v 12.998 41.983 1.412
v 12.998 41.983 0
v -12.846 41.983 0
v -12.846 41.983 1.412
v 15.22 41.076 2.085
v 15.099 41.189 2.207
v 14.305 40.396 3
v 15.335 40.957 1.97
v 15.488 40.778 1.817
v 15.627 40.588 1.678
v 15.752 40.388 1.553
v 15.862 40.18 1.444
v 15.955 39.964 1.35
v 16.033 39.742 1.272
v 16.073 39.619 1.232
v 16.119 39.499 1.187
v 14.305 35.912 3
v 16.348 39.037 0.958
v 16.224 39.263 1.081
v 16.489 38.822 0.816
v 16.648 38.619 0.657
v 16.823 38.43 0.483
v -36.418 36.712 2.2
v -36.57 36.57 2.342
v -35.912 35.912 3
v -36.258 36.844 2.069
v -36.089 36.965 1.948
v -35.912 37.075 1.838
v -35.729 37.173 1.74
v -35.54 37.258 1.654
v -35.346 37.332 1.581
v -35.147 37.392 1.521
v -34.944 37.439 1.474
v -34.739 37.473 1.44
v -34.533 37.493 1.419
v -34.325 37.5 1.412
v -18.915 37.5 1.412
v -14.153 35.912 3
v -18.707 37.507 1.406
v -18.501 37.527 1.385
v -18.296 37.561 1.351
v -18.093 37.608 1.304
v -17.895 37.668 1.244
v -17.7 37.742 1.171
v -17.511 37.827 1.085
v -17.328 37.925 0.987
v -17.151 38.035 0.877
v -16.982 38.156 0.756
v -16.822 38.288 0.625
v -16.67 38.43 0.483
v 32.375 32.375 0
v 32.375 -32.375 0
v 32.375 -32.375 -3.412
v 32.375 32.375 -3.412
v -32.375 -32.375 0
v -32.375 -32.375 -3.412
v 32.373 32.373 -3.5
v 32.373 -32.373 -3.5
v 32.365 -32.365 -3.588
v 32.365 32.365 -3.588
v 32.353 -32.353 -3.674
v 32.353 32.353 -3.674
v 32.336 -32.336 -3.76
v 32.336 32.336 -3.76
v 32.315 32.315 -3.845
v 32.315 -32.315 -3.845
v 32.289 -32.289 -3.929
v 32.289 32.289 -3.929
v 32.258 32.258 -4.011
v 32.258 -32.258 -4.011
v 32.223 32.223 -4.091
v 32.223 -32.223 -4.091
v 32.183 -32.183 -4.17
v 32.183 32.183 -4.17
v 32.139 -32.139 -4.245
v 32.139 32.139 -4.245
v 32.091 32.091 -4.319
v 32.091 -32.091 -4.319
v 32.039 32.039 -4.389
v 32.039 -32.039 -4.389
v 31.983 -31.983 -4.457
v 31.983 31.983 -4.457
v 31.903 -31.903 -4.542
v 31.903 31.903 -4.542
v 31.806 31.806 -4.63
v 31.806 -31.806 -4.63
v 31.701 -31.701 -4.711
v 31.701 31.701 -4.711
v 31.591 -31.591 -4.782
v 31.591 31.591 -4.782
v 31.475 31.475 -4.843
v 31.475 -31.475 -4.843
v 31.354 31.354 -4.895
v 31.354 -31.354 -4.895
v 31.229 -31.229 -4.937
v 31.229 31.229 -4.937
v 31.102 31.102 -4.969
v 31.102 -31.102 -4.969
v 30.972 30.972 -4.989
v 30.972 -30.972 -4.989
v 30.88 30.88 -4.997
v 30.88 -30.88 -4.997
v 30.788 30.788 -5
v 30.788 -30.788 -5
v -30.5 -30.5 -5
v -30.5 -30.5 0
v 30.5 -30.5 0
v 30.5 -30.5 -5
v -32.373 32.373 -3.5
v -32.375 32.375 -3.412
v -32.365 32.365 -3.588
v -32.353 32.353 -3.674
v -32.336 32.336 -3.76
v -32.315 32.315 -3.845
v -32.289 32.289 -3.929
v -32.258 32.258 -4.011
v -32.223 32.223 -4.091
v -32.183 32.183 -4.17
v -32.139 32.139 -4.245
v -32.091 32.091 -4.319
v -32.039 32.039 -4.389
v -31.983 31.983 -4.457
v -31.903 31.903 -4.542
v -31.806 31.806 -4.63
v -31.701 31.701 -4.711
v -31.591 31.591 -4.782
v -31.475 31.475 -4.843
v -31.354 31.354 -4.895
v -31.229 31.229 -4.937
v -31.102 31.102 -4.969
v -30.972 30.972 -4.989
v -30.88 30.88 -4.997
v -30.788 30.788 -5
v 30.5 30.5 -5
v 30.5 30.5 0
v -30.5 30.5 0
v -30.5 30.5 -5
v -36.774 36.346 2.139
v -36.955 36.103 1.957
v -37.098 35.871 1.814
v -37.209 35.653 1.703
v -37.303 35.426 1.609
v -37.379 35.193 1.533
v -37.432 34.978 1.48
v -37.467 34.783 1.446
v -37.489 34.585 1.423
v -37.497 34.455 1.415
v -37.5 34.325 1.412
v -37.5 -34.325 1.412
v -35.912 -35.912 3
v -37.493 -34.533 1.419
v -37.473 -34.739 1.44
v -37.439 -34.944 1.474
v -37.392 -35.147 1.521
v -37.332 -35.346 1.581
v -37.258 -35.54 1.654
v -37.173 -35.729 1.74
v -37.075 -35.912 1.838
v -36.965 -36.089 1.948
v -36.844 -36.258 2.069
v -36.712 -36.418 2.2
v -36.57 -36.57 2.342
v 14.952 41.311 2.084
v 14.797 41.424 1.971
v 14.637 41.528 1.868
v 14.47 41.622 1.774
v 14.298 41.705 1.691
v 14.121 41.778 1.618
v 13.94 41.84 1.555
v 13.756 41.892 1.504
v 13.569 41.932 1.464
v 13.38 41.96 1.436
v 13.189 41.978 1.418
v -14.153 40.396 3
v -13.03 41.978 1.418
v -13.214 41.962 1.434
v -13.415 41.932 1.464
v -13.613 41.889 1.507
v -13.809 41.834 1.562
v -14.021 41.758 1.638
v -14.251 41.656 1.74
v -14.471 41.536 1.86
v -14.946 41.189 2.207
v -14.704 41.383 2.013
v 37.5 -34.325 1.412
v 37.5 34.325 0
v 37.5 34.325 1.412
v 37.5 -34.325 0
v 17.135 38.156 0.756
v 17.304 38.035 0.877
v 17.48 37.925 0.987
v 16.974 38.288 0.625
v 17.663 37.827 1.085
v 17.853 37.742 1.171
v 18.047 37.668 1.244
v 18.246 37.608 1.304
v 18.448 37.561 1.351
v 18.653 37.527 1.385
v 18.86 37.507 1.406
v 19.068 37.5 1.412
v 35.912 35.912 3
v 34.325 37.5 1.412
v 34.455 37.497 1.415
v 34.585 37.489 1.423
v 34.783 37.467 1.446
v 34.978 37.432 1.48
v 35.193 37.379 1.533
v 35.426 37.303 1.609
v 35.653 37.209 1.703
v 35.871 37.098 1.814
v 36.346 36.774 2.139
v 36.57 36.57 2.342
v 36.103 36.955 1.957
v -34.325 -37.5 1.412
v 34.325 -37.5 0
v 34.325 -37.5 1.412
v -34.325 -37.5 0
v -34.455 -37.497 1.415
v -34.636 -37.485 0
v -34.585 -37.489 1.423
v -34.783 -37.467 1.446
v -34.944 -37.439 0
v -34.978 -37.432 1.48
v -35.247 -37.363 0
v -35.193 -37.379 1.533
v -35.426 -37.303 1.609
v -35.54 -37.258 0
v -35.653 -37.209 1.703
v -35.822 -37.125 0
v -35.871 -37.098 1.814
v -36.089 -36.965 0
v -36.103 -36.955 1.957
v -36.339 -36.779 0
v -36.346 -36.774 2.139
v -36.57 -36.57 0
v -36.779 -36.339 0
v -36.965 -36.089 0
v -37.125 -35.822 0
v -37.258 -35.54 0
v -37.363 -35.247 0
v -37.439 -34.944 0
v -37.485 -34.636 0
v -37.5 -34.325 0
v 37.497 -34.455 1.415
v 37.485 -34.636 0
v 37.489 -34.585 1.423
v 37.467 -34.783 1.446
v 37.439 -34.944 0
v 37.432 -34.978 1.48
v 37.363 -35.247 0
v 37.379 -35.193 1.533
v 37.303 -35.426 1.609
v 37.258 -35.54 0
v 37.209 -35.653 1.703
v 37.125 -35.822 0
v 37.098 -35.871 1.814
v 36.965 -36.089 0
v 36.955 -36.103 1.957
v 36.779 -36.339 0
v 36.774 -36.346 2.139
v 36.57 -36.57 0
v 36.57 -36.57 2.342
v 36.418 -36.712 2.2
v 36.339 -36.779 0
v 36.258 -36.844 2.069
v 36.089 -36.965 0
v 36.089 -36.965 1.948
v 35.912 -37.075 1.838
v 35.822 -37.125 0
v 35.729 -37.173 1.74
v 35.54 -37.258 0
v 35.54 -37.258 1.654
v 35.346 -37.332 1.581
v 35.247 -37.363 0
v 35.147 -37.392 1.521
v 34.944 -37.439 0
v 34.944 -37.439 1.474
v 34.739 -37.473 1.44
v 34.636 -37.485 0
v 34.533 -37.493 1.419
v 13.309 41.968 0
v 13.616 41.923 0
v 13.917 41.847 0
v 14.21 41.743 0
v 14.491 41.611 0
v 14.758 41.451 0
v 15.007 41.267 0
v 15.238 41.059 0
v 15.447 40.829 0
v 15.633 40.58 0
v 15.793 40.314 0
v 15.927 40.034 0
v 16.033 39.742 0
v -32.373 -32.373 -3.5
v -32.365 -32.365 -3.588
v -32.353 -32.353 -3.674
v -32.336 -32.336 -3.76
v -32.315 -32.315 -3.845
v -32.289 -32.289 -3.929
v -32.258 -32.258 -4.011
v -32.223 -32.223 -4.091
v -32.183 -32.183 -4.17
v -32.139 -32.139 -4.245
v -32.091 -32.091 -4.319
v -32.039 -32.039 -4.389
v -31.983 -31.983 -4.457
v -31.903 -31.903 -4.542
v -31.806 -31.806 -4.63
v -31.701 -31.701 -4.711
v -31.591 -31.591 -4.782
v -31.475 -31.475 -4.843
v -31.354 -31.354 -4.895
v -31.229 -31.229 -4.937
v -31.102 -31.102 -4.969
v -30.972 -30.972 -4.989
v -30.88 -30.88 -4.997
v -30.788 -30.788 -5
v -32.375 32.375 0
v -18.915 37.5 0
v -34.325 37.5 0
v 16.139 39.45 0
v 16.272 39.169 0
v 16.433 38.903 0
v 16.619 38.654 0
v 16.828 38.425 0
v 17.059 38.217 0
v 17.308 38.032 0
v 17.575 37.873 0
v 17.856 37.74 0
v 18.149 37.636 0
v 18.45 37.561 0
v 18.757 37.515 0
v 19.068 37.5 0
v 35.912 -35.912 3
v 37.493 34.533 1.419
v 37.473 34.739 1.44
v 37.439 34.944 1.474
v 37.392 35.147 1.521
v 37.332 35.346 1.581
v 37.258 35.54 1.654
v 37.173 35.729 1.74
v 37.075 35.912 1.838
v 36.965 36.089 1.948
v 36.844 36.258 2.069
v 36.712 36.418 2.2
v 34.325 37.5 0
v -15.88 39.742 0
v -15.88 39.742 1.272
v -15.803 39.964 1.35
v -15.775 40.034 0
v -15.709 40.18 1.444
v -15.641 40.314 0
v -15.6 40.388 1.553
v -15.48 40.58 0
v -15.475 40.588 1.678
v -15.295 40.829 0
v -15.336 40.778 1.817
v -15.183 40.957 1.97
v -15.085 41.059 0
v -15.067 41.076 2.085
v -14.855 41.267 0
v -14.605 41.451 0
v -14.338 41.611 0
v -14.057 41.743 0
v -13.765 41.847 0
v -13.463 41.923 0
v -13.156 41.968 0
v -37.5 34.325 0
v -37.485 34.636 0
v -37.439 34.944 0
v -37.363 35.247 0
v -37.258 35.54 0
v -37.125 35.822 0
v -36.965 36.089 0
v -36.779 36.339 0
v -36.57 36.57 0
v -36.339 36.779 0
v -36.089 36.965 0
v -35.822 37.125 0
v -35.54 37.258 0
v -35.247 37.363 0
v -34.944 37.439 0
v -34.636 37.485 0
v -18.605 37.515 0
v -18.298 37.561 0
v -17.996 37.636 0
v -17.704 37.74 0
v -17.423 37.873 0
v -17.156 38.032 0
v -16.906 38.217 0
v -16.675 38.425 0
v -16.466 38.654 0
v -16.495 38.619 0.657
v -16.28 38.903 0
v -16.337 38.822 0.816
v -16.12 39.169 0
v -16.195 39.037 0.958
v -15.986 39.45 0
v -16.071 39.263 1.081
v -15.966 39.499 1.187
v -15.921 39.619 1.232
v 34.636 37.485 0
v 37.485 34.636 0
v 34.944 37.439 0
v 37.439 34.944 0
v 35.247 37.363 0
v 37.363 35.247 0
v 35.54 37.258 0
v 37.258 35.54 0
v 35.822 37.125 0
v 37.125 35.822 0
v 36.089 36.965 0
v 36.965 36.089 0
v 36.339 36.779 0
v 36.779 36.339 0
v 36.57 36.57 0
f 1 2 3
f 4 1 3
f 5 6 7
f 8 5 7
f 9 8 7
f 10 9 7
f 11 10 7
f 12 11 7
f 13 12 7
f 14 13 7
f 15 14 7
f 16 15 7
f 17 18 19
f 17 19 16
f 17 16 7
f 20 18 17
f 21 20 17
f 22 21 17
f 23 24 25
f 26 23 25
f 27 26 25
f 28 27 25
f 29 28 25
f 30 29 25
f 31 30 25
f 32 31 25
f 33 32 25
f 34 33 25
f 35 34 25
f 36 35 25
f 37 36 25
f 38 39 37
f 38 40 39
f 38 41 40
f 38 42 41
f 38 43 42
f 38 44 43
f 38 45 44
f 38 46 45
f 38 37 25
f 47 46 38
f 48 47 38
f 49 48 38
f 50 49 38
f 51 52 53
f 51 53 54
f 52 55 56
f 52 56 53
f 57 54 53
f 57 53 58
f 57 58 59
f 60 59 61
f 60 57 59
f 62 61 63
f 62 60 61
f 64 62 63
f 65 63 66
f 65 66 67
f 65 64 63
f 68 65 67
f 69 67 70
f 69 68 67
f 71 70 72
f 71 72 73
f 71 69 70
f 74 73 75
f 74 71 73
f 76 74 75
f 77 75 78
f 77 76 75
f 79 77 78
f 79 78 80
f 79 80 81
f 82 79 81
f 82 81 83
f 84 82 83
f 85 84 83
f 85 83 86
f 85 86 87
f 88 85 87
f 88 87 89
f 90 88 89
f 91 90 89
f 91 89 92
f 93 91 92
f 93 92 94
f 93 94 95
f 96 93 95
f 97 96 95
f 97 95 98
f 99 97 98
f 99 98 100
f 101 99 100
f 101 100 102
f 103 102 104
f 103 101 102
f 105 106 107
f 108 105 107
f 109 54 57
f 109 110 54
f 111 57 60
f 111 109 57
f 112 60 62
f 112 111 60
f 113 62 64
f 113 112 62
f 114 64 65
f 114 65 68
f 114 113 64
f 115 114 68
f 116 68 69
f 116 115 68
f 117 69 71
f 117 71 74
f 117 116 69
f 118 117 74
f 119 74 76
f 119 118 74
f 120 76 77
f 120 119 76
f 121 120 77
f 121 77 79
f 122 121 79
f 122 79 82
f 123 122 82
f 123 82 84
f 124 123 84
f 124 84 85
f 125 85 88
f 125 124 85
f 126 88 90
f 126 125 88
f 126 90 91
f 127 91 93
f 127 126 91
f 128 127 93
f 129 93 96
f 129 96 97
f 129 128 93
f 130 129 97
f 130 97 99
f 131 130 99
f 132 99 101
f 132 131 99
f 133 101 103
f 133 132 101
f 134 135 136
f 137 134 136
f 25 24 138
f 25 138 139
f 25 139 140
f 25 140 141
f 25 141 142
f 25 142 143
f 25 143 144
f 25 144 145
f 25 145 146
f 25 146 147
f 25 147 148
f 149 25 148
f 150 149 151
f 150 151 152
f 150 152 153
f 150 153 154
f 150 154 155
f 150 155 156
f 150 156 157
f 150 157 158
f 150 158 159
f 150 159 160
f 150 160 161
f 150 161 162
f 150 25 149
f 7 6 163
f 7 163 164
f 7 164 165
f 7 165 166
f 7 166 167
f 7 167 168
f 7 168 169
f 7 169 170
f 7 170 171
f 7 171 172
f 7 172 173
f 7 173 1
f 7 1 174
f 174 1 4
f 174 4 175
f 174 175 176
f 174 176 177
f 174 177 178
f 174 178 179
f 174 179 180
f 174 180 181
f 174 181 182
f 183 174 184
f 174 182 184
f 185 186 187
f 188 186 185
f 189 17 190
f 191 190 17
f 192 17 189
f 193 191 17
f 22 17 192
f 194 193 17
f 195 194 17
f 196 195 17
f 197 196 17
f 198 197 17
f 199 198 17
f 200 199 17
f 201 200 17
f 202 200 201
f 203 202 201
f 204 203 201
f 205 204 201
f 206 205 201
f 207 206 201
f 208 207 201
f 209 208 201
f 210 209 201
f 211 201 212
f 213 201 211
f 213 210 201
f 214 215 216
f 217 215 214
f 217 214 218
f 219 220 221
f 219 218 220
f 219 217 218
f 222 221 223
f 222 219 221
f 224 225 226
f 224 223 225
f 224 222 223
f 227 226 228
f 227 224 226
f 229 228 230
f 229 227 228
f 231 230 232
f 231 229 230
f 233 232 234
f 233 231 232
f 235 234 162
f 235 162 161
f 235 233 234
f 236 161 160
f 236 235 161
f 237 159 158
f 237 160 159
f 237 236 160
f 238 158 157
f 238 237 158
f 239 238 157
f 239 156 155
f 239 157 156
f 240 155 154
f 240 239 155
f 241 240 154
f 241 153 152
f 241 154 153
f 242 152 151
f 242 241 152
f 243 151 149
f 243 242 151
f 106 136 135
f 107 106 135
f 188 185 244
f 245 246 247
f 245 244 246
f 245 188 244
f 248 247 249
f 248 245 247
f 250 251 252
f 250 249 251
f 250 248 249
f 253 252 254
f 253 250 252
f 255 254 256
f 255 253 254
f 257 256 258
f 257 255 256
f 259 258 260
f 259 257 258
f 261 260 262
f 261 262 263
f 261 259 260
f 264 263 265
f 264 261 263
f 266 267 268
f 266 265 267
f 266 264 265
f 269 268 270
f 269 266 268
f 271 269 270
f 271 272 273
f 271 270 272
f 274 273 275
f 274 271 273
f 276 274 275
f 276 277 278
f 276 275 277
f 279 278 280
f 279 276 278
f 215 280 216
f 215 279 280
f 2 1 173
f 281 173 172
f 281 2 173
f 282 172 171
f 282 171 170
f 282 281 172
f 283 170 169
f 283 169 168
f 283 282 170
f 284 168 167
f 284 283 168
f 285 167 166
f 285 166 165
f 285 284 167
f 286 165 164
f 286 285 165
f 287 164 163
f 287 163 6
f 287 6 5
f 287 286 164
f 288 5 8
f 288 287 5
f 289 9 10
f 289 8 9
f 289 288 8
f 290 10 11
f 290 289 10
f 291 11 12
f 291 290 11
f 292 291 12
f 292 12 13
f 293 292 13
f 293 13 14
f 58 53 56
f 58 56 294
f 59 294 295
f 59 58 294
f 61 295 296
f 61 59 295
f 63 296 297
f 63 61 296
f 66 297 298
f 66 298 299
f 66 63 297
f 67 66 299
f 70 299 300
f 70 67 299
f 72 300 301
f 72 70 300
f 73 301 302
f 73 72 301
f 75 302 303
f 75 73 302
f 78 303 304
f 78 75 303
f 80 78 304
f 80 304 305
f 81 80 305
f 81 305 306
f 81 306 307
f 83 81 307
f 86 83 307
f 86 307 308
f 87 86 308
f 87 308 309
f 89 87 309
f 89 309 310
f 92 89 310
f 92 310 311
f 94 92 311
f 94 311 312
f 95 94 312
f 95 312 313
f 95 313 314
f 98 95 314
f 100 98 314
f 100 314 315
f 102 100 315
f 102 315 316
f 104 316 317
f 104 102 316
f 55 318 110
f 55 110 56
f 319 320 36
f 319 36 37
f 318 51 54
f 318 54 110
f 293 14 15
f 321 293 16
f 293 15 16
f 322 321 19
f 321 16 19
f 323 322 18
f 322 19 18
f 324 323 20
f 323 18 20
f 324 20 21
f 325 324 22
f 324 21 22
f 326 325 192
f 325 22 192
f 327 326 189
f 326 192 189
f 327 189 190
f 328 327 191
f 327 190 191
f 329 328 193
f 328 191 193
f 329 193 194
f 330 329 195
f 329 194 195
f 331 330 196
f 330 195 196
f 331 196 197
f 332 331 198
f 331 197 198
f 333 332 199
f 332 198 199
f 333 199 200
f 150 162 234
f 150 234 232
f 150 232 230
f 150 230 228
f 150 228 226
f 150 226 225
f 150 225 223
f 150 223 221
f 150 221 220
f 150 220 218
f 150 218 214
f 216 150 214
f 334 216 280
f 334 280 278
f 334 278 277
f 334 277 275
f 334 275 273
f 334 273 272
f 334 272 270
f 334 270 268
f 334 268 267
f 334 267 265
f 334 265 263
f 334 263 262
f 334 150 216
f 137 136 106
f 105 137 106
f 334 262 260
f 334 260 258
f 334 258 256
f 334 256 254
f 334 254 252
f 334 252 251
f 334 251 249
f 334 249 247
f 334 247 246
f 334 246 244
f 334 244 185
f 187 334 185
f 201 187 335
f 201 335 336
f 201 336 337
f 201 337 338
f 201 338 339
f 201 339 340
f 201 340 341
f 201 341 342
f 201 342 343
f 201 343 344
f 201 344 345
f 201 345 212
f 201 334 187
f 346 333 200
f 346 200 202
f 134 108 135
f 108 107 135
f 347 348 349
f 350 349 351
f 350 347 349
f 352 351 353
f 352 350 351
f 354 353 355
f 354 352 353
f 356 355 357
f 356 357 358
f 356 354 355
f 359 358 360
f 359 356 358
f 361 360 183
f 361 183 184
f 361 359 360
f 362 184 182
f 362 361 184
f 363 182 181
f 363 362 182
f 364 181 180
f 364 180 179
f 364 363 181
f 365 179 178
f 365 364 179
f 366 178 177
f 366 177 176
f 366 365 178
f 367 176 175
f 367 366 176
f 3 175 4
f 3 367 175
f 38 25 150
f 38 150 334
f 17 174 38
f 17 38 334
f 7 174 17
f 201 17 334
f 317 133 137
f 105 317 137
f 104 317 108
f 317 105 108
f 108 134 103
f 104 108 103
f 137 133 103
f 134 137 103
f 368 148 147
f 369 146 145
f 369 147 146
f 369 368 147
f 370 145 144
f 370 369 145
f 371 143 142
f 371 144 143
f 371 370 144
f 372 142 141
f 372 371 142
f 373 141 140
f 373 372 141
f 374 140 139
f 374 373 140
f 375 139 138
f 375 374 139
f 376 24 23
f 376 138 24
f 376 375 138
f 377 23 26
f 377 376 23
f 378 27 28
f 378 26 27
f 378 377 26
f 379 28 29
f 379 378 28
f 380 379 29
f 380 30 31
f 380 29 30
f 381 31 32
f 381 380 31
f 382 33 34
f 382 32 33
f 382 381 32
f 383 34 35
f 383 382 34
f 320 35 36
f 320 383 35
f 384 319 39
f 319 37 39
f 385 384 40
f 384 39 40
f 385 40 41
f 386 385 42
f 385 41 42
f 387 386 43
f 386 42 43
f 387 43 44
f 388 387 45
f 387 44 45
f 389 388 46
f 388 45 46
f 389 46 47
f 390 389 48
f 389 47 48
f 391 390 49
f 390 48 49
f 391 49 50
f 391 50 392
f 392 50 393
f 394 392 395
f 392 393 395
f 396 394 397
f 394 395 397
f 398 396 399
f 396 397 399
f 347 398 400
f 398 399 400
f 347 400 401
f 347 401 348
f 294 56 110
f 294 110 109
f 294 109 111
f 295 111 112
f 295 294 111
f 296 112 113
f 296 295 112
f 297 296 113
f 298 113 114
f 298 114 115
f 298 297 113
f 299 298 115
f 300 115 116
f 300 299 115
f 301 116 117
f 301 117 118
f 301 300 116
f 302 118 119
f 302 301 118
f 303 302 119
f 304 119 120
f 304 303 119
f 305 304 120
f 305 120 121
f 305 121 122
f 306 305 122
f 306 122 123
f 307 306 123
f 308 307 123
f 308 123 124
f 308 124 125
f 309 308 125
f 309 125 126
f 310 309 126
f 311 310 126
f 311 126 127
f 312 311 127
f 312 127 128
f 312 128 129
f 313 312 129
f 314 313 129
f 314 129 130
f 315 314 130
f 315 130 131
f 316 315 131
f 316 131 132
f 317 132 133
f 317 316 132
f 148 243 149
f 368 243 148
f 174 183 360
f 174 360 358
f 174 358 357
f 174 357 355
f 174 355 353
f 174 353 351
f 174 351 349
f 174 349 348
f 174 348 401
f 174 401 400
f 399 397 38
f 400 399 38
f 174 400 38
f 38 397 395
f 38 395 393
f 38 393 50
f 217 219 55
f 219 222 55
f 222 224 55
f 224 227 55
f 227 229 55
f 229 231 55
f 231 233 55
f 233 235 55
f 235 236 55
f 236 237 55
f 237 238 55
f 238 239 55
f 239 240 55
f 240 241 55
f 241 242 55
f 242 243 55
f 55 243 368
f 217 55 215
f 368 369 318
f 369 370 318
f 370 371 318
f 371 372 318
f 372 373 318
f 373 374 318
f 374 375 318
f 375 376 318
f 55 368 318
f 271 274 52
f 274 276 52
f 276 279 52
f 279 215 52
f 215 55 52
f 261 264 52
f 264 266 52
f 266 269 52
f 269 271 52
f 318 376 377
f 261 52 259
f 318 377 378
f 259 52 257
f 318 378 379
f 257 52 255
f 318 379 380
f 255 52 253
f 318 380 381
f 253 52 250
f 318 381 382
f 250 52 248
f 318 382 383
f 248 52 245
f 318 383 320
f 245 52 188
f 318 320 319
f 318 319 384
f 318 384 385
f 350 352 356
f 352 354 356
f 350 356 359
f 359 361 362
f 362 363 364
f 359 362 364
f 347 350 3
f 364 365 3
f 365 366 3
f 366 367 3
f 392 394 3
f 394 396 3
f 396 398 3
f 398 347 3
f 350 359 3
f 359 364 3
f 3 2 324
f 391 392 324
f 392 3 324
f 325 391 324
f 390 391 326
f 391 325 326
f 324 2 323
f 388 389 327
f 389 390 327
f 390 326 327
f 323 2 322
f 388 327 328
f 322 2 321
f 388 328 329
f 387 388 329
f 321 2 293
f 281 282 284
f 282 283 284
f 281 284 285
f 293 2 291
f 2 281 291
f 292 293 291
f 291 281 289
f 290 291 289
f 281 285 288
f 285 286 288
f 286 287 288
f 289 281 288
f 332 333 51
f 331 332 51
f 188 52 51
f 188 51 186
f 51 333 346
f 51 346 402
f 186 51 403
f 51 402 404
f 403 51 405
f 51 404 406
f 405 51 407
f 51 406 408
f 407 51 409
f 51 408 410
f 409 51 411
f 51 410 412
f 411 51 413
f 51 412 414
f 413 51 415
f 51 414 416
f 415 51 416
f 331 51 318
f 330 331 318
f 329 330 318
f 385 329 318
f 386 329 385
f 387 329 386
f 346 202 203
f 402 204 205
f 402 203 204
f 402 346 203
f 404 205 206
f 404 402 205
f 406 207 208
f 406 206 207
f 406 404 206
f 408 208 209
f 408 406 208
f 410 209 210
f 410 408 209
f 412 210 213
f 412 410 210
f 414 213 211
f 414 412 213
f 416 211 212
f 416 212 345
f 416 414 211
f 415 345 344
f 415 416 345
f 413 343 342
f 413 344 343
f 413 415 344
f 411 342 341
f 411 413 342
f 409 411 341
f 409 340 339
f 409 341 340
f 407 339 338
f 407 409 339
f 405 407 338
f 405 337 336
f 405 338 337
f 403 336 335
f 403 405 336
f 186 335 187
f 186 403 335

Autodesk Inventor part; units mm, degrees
ref_plane "YZ Plane" through (0, 0, 0) normal (1, 0, 0) x (0, 1, 0)
ref_plane "XZ Plane" through (0, 0, 0) normal (0, 1, 0) x (-1, 0, 0)
ref_plane "XY Plane" through (0, 0, 0) normal (0, 0, 1) x (1, 0, 0)
sketch "Sketch1" plane through (0, 0, 0) normal (0, 0, 1) x (1, 0, 0)
  line L0 (37.5, -37.5) -> (-37.5, -37.5)
  line L1 (-37.5, -37.5) -> (-37.5, 37.5)
  line L2 (-37.5, 37.5) -> (37.5, 37.5)
  line L3 (37.5, 37.5) -> (37.5, -37.5)
  line L4 (37.5, -37.5) -> (-37.5, 37.5) construction
  line L5 (-37.5, -37.5) -> (37.5, 37.5) construction
  line L6 (32.5, 32.5) -> (-32.5, 32.5)
  line L7 (-32.5, 32.5) -> (-32.5, -32.5)
  line L8 (-32.5, -32.5) -> (32.5, -32.5)
  line L9 (32.5, -32.5) -> (32.5, 32.5)
  line L10 (32.5, 32.5) -> (-32.5, -32.5) construction
  line L11 (-32.5, 32.5) -> (32.5, -32.5) construction
  line L12 (30.5, 30.5) -> (-30.5, 30.5)
  line L13 (-30.5, 30.5) -> (-30.5, -30.5)
  line L14 (-30.5, -30.5) -> (30.5, -30.5)
  line L15 (30.5, -30.5) -> (30.5, 30.5)
  line L16 (30.5, 30.5) -> (-30.5, -30.5) construction
  line L17 (-30.5, 30.5) -> (30.5, -30.5) construction
  line L18 (-4.8636, 37.5) -> (-36.3868, 37.5)
  line L19 (0, 41.9833) -> (-15.7401, 41.9833)
  line L20 (-15.7401, 41.9833) -> (-15.7401, 37.5)
  line L21 (0, 41.9833) -> (15.8927, 41.9833)
  line L22 (15.8927, 41.9833) -> (15.8927, 37.5)
  point P0 (0, 0)
  dimension "d2" = 65
  dimension "d3" = 65
  dimension "d4" = 2
  dimension "d5" = 2
  dimension "d22" = 5
  dimension "d23" = 5
extrude "Extrusion1" add sketch "Sketch1" along normal blind 3 contours L0 L1 L2 L3 | L2 L20 L19 L21 L22 | L9 L8 L7 L6 | L15 L14 L13 L12
extrude "Extrusion2" add sketch "Sketch1" against normal blind 5 contours L9 L8 L7 L6
chamfer "Chamfer1" distance 1.5875 angle 45 8 edges at (0, -37.5, 3) (-37.5, 0, 3) (26.6963, 37.5, 3) (-26.62, 37.5, 3) (37.5, 0, 3) (15.8927, 39.7416, 3) (0.0763, 41.9833, 3) (-15.7401, 39.7416, 3)
fillet "Fillet2" radius 3.175 8 edges at (-37.5, -37.5, 0.7063) (37.5, -37.5, 0.7063) (37.5, 37.5, 0.7063) (-37.5, 37.5, 0.7063) (15.8927, 37.5, 0.7063) (15.8927, 41.9833, 0.7063) (-15.7401, 41.9833, 0.7063) (-15.7401, 37.5, 0.7063)
thicken "Thicken1" operation cut thickness 0.125 both sides no extend neighbours no toward (1, 0, 0) faces at (-32.5, 10.8333, -3.3333) (-10.8333, -32.5, -3.3333) (32.5, -10.8333, -3.3333) (10.8333, 32.5, -3.3333)
fillet "Fillet3" radius 1.5875 4 edges at (32.375, 0, -5) (-32.375, 0, -5) (0, 32.375, -5) (0, -32.375, -5)
properties part number "Lid" material "PET Plastic"
